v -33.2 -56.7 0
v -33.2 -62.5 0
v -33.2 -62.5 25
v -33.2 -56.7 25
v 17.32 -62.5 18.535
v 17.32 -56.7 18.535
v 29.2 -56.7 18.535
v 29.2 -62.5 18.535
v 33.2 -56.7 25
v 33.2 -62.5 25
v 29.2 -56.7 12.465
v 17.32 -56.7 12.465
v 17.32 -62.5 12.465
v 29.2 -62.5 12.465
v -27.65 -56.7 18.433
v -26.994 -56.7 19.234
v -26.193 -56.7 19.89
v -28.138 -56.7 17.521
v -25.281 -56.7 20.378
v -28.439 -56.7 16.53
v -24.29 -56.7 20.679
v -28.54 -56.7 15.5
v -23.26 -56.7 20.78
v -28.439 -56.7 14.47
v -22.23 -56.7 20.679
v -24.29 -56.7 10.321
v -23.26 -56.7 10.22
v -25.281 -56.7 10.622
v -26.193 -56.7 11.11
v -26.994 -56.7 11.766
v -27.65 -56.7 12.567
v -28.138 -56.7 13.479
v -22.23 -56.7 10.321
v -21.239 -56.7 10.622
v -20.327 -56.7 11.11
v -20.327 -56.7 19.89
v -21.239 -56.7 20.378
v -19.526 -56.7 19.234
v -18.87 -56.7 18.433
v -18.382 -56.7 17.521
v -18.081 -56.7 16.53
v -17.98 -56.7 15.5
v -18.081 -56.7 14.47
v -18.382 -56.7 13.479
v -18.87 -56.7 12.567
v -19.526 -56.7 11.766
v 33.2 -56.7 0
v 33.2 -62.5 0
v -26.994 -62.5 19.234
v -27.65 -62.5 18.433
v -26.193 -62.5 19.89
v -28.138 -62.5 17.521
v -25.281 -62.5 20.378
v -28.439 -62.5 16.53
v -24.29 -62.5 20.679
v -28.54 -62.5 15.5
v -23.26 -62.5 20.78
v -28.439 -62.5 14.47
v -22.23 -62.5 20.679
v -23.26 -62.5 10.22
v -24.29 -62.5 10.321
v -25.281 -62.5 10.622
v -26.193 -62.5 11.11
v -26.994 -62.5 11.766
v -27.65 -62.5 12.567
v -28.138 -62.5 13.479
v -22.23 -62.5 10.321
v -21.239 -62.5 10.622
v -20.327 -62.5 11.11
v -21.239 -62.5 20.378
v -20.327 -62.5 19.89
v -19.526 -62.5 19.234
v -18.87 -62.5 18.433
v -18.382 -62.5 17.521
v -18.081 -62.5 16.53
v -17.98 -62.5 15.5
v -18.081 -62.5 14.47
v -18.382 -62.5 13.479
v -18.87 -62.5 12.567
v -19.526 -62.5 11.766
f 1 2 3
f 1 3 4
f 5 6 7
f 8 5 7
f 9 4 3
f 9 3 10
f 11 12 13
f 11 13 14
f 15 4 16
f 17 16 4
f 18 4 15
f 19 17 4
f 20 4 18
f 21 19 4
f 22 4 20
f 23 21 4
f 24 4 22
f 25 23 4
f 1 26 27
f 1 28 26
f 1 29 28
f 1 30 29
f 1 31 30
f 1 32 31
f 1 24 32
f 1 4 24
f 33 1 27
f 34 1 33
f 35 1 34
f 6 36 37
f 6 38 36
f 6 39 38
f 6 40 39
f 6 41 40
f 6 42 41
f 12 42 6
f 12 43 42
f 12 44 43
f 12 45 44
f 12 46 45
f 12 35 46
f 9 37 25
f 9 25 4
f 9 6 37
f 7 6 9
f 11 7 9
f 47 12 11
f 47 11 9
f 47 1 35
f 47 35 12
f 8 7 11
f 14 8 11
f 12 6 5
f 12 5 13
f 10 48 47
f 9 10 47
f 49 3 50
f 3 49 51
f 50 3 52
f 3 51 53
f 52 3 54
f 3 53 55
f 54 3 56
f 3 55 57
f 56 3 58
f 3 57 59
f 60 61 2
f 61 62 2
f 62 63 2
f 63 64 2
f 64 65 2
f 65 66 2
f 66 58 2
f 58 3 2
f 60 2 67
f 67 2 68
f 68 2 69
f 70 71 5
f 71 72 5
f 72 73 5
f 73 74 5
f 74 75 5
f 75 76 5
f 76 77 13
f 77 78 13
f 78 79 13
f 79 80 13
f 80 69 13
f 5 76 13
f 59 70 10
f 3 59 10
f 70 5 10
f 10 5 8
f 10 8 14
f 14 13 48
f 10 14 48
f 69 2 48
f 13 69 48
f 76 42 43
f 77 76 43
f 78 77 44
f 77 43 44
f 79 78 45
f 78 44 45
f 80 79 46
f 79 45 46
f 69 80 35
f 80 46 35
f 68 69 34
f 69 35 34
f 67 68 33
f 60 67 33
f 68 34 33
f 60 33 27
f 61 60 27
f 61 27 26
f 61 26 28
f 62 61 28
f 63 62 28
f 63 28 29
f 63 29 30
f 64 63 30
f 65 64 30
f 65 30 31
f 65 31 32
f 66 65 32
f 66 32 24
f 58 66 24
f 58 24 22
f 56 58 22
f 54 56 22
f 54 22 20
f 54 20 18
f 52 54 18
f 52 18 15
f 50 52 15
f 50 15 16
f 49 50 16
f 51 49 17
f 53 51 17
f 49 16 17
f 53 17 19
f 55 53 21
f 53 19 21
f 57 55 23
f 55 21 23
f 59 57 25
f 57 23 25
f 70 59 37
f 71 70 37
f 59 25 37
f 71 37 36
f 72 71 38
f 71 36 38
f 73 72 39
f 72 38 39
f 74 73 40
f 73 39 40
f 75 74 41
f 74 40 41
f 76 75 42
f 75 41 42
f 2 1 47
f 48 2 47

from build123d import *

# Parameters (mm, degrees)
SKETCH1_W           = 66.4
SKETCH1_H           = 5.8
BOSS_EXTRUDE1_DEPTH = 25
SKETCH3_R           = 5.28
SKETCH3_W           = 11.88
SKETCH3_H           = 6.07
CUT_EXTRUDE3_DEPTH  = 6.8


with BuildPart() as part:
    # Sketch1 → Boss-Extrude1 (new body)
    with BuildSketch(Plane.XY):
        with Locations((0, -59.6)):
            Rectangle(SKETCH1_W, SKETCH1_H)
    extrude(amount=BOSS_EXTRUDE1_DEPTH)

    # Sketch3 → Cut-Extrude3 (cut, through all)
    with BuildSketch(Plane(origin=(0, -56.7, 0), x_dir=(1, 0, 0), z_dir=(0, 1, 0))):
        with Locations((-23.26, -15.500000019)):
            Circle(SKETCH3_R)
        with Locations((23.26, -15.500000019)):
            Rectangle(SKETCH3_W, SKETCH3_H)
    extrude(amount=-CUT_EXTRUDE3_DEPTH, mode=Mode.SUBTRACT)


solid = part.part
